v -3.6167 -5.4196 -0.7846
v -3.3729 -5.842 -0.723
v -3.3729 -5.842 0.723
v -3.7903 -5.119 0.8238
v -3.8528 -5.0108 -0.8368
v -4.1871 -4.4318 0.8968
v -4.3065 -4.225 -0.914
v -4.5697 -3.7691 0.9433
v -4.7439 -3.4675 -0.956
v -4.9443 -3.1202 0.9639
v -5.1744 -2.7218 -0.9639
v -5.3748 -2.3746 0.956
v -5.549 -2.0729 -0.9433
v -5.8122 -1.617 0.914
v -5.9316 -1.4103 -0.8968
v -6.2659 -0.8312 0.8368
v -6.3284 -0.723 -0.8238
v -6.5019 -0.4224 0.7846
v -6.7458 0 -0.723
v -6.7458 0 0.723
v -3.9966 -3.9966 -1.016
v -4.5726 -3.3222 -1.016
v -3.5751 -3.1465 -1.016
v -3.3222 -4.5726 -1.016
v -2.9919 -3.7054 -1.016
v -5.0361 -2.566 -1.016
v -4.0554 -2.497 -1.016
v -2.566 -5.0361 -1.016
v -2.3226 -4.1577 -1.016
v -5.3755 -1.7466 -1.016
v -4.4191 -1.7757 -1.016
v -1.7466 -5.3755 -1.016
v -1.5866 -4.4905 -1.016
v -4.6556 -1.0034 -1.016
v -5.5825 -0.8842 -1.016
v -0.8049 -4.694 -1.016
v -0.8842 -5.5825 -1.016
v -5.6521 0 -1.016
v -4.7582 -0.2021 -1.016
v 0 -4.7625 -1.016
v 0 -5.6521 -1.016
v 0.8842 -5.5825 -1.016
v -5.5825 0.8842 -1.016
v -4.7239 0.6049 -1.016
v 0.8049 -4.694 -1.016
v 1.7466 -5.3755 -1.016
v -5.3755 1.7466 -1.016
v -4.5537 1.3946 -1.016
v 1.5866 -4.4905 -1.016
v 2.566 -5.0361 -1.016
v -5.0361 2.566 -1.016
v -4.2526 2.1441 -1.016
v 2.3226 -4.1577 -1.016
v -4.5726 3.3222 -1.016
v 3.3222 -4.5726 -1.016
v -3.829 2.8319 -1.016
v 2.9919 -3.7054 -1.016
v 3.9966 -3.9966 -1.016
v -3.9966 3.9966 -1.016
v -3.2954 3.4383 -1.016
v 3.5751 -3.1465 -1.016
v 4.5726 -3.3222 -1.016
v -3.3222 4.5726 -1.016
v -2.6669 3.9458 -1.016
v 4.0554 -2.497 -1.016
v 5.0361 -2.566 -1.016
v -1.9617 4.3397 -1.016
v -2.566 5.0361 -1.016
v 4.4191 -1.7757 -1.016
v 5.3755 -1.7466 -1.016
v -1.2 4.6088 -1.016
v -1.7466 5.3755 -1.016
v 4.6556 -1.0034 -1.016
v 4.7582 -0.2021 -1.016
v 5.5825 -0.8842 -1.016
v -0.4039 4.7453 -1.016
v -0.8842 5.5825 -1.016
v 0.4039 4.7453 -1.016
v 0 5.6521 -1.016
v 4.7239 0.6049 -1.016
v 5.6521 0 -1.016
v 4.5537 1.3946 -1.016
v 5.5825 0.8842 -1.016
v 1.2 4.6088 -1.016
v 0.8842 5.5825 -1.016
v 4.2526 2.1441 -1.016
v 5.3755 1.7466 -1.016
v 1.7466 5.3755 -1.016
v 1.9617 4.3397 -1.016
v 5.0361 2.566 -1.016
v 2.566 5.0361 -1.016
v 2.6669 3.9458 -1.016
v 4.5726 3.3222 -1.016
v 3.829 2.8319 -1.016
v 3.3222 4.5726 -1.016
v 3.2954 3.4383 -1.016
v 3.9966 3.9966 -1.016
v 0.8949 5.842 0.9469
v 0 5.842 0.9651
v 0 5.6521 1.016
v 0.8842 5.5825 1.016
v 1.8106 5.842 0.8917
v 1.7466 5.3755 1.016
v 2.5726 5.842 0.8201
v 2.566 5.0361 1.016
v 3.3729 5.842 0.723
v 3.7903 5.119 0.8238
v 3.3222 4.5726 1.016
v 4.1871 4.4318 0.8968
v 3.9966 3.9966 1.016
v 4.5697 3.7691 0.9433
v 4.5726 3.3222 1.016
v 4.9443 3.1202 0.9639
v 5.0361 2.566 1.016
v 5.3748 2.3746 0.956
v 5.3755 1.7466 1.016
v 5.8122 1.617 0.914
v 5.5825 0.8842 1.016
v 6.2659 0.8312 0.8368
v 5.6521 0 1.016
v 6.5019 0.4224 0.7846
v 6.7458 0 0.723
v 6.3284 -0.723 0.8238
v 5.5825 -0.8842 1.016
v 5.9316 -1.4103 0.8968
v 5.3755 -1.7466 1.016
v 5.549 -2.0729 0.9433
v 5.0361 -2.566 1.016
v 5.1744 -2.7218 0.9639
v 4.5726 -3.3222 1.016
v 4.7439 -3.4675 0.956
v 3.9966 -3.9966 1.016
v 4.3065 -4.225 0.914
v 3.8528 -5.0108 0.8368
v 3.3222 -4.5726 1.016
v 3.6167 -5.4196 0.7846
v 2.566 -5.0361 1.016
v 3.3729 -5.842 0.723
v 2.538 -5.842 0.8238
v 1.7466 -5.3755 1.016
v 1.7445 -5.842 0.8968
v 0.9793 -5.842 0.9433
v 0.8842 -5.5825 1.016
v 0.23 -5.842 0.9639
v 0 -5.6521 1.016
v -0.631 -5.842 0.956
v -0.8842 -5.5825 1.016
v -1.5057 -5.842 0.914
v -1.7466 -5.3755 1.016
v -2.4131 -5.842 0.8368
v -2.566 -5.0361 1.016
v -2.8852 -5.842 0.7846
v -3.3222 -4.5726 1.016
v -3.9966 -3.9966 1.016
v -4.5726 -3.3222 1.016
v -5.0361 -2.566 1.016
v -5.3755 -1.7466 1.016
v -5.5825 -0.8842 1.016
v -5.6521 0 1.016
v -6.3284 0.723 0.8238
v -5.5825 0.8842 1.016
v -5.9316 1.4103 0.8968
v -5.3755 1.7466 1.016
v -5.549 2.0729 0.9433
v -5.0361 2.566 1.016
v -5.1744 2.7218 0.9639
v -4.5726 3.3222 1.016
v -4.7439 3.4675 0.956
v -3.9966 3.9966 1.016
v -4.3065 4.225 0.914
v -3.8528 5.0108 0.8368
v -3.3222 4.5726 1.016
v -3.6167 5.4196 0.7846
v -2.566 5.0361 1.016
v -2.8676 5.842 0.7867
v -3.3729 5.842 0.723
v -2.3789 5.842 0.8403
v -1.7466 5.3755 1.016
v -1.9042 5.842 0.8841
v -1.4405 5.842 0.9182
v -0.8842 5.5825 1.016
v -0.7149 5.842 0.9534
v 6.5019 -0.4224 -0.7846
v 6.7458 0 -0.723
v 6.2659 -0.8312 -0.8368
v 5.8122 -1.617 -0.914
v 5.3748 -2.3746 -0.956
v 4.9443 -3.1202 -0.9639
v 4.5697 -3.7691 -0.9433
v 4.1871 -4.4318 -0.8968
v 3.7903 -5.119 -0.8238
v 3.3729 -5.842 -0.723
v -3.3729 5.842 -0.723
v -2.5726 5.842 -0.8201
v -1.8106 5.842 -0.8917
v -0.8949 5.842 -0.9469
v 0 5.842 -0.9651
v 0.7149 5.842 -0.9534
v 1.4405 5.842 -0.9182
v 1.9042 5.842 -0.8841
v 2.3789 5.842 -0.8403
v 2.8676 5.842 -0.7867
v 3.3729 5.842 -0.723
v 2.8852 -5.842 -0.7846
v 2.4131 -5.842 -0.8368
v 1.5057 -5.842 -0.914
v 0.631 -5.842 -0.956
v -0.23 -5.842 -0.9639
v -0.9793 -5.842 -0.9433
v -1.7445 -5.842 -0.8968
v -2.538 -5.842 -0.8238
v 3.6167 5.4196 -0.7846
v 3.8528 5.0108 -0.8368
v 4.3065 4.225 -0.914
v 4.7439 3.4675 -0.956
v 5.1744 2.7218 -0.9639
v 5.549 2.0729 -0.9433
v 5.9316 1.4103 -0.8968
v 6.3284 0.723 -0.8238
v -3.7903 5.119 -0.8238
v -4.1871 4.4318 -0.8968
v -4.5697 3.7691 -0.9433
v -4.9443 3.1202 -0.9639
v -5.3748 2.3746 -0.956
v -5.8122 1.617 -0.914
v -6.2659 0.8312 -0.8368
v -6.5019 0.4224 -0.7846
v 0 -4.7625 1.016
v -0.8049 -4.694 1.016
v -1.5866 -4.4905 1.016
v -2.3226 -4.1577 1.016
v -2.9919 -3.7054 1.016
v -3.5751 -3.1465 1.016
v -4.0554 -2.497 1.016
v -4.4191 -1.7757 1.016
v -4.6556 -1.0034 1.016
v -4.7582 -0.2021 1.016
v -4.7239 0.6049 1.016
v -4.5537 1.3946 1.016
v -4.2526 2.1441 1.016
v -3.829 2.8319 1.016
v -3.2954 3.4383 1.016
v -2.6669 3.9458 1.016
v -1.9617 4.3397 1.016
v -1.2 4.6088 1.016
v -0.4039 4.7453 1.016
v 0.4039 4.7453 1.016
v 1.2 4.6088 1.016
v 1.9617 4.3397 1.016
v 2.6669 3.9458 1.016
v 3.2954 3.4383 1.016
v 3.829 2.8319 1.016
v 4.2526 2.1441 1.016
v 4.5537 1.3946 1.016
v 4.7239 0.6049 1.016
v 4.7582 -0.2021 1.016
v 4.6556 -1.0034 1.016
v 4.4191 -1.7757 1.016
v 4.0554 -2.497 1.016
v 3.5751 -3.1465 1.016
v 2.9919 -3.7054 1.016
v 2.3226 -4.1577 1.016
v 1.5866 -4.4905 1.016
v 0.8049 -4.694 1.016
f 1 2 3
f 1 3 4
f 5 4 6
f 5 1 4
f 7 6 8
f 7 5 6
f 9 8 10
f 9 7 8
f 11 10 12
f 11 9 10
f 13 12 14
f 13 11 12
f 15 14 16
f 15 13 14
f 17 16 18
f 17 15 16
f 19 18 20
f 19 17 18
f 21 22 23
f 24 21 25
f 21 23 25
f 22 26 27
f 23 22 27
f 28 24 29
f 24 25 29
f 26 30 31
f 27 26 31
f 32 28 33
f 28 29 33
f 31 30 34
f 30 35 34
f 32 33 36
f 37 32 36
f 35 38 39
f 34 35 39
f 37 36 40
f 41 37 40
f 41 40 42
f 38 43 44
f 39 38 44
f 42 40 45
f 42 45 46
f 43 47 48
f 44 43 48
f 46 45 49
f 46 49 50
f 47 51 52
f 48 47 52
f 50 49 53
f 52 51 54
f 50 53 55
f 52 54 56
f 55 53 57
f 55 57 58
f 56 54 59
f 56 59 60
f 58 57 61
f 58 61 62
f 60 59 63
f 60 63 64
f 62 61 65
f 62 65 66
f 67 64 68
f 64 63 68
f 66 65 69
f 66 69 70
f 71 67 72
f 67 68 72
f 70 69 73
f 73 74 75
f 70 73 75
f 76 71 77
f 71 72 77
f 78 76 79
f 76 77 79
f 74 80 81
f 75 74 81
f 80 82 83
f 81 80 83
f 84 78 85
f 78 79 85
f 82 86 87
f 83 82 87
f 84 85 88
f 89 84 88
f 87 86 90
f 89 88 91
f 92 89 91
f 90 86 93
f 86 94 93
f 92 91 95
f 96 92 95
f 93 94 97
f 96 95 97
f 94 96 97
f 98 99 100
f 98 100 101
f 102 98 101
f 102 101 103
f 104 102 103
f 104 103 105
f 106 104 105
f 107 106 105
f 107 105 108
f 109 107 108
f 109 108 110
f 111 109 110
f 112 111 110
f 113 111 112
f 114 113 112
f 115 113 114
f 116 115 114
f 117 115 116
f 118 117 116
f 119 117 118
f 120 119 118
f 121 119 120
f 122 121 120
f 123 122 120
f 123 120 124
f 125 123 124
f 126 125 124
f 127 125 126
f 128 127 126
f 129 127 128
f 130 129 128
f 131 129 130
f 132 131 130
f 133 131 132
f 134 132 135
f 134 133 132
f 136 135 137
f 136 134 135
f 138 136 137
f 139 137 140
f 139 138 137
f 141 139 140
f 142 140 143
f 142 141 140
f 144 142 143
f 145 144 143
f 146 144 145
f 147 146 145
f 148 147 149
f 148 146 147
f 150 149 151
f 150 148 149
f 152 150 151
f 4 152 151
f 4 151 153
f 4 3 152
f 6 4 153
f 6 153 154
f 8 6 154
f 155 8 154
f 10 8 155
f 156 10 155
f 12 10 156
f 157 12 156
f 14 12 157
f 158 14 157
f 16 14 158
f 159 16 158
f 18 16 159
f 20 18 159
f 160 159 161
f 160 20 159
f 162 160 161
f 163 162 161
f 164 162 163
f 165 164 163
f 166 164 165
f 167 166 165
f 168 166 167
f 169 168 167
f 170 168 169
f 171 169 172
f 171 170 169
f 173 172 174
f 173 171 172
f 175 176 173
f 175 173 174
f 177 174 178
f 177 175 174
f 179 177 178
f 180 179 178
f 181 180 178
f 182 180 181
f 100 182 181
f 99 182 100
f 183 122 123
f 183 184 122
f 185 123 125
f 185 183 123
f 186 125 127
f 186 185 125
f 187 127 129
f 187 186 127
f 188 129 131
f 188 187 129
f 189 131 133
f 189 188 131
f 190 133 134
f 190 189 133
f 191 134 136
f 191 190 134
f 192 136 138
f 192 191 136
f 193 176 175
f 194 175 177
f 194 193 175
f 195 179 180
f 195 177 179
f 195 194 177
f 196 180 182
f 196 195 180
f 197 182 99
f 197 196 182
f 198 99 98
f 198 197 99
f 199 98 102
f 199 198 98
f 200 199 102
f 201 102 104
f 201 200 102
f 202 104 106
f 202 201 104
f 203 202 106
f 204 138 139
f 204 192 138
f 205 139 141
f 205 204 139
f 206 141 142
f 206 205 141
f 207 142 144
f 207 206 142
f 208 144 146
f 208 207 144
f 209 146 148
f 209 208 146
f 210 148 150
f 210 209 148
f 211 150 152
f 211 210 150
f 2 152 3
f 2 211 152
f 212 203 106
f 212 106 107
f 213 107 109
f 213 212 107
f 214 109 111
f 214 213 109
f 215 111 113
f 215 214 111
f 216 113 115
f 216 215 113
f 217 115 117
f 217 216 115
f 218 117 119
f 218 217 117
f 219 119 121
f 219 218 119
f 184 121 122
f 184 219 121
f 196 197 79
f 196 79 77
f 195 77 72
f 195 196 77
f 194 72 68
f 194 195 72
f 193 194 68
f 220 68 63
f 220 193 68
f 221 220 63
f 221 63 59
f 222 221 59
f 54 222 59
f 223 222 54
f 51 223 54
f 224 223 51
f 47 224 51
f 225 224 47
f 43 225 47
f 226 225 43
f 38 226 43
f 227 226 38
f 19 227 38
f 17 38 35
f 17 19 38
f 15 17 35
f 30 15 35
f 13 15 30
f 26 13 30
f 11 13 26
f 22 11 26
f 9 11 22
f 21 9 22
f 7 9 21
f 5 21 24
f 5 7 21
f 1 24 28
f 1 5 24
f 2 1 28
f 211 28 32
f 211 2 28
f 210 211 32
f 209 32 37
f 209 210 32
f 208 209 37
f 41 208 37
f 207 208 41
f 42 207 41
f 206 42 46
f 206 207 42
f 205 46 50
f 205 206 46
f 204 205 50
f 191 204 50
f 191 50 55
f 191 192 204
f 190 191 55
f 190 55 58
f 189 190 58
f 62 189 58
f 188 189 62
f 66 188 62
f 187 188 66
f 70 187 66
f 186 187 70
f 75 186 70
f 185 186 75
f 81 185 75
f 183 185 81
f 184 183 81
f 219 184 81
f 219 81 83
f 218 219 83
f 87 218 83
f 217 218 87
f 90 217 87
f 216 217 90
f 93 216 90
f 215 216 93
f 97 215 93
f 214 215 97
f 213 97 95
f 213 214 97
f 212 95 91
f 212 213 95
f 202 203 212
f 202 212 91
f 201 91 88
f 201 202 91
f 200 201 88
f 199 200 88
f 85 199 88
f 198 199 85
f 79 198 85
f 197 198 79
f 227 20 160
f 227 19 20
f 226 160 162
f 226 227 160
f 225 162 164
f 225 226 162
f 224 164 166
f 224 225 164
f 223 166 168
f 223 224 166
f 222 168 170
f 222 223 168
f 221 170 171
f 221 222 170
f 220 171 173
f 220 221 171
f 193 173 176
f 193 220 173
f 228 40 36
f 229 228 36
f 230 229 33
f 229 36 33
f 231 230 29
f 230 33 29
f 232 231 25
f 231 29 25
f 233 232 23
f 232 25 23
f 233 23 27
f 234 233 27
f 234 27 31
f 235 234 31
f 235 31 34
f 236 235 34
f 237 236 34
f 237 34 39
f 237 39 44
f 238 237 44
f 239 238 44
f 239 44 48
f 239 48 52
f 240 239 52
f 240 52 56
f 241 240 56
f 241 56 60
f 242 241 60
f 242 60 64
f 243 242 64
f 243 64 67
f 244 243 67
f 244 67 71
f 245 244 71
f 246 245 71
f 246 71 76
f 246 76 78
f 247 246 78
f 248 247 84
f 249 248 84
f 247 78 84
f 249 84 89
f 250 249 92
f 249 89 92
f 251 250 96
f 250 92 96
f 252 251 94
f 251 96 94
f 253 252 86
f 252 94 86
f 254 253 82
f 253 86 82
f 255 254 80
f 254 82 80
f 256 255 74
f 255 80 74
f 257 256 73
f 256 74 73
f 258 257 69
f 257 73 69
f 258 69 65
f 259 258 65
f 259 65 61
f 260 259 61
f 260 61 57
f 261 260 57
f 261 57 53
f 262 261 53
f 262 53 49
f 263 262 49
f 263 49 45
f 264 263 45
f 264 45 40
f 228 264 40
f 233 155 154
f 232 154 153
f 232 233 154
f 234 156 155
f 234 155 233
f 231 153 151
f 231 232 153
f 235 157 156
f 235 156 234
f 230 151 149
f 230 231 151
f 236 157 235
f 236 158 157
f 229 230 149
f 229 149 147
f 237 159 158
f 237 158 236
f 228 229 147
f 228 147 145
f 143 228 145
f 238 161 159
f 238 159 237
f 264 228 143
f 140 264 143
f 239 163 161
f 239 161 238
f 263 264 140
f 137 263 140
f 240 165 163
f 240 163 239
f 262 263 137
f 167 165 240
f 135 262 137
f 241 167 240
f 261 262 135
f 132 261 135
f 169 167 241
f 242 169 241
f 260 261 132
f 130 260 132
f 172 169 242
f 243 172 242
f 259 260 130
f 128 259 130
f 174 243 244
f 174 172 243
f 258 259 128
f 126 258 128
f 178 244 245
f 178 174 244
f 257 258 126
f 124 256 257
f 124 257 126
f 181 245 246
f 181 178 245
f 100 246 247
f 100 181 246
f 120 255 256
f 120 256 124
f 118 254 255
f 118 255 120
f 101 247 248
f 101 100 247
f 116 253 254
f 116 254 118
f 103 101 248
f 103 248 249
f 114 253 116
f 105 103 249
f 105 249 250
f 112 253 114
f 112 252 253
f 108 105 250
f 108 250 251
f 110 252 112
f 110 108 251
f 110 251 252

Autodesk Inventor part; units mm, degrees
ref_plane "YZ Plane" through (0, 0, 0) normal (1, 0, 0) x (0, 1, 0)
ref_plane "XZ Plane" through (0, 0, 0) normal (0, 1, 0) x (-1, 0, 0)
ref_plane "XY Plane" through (0, 0, 0) normal (0, 0, 1) x (1, 0, 0)
sketch "Sketch1" plane through (0, 0, 0) normal (0, 0, 1) x (1, 0, 0)
  line L0 (-3.3729, 5.842) -> (3.3729, 5.842)
  line L1 (3.3729, 5.842) -> (6.7458, 0)
  line L2 (6.7458, 0) -> (3.3729, -5.842)
  line L3 (3.3729, -5.842) -> (-3.3729, -5.842)
  line L4 (-3.3729, -5.842) -> (-6.7458, 0)
  line L5 (-6.7458, 0) -> (-3.3729, 5.842)
  point P0 (0, 0)
  point P1 (0, 0)
  dimension "d0" = 11.684
extrude "Extrusion1" add sketch "Sketch1" along normal mid plane 2.032
sketch "Sketch2" plane through (0, 0, 0) normal (1, 0, 0) x (0, 1, 0)
  line L0 (5.6521, 1.016) -> (7.9534, 1.016)
  line L1 (7.9534, 1.016) -> (7.9534, 0.3994)
  line L2 (7.9534, 0.3994) -> (5.6521, 1.016)
  line L3 (0, 1.016) -> (5.842, 1.016) projected
  line L4 (0, -0.4064) -> (0, 2.4384) projected
  point P0 (0, 0)
  dimension "d3" = 15
revolve "Revolution1" cut sketch "Sketch2" angle 360 about axis through (0, 0, -10) along (0, 0, 1)
mirror "Mirror1" about plane through (0, 0, 0) normal (0, 0, 1) of "Revolution1"
hole "Hole1" at (0, 0, 1.016) direction (0, 0, -1) diameter 9.525 end through all
properties part number "Nut" material "Stainless Steel"
